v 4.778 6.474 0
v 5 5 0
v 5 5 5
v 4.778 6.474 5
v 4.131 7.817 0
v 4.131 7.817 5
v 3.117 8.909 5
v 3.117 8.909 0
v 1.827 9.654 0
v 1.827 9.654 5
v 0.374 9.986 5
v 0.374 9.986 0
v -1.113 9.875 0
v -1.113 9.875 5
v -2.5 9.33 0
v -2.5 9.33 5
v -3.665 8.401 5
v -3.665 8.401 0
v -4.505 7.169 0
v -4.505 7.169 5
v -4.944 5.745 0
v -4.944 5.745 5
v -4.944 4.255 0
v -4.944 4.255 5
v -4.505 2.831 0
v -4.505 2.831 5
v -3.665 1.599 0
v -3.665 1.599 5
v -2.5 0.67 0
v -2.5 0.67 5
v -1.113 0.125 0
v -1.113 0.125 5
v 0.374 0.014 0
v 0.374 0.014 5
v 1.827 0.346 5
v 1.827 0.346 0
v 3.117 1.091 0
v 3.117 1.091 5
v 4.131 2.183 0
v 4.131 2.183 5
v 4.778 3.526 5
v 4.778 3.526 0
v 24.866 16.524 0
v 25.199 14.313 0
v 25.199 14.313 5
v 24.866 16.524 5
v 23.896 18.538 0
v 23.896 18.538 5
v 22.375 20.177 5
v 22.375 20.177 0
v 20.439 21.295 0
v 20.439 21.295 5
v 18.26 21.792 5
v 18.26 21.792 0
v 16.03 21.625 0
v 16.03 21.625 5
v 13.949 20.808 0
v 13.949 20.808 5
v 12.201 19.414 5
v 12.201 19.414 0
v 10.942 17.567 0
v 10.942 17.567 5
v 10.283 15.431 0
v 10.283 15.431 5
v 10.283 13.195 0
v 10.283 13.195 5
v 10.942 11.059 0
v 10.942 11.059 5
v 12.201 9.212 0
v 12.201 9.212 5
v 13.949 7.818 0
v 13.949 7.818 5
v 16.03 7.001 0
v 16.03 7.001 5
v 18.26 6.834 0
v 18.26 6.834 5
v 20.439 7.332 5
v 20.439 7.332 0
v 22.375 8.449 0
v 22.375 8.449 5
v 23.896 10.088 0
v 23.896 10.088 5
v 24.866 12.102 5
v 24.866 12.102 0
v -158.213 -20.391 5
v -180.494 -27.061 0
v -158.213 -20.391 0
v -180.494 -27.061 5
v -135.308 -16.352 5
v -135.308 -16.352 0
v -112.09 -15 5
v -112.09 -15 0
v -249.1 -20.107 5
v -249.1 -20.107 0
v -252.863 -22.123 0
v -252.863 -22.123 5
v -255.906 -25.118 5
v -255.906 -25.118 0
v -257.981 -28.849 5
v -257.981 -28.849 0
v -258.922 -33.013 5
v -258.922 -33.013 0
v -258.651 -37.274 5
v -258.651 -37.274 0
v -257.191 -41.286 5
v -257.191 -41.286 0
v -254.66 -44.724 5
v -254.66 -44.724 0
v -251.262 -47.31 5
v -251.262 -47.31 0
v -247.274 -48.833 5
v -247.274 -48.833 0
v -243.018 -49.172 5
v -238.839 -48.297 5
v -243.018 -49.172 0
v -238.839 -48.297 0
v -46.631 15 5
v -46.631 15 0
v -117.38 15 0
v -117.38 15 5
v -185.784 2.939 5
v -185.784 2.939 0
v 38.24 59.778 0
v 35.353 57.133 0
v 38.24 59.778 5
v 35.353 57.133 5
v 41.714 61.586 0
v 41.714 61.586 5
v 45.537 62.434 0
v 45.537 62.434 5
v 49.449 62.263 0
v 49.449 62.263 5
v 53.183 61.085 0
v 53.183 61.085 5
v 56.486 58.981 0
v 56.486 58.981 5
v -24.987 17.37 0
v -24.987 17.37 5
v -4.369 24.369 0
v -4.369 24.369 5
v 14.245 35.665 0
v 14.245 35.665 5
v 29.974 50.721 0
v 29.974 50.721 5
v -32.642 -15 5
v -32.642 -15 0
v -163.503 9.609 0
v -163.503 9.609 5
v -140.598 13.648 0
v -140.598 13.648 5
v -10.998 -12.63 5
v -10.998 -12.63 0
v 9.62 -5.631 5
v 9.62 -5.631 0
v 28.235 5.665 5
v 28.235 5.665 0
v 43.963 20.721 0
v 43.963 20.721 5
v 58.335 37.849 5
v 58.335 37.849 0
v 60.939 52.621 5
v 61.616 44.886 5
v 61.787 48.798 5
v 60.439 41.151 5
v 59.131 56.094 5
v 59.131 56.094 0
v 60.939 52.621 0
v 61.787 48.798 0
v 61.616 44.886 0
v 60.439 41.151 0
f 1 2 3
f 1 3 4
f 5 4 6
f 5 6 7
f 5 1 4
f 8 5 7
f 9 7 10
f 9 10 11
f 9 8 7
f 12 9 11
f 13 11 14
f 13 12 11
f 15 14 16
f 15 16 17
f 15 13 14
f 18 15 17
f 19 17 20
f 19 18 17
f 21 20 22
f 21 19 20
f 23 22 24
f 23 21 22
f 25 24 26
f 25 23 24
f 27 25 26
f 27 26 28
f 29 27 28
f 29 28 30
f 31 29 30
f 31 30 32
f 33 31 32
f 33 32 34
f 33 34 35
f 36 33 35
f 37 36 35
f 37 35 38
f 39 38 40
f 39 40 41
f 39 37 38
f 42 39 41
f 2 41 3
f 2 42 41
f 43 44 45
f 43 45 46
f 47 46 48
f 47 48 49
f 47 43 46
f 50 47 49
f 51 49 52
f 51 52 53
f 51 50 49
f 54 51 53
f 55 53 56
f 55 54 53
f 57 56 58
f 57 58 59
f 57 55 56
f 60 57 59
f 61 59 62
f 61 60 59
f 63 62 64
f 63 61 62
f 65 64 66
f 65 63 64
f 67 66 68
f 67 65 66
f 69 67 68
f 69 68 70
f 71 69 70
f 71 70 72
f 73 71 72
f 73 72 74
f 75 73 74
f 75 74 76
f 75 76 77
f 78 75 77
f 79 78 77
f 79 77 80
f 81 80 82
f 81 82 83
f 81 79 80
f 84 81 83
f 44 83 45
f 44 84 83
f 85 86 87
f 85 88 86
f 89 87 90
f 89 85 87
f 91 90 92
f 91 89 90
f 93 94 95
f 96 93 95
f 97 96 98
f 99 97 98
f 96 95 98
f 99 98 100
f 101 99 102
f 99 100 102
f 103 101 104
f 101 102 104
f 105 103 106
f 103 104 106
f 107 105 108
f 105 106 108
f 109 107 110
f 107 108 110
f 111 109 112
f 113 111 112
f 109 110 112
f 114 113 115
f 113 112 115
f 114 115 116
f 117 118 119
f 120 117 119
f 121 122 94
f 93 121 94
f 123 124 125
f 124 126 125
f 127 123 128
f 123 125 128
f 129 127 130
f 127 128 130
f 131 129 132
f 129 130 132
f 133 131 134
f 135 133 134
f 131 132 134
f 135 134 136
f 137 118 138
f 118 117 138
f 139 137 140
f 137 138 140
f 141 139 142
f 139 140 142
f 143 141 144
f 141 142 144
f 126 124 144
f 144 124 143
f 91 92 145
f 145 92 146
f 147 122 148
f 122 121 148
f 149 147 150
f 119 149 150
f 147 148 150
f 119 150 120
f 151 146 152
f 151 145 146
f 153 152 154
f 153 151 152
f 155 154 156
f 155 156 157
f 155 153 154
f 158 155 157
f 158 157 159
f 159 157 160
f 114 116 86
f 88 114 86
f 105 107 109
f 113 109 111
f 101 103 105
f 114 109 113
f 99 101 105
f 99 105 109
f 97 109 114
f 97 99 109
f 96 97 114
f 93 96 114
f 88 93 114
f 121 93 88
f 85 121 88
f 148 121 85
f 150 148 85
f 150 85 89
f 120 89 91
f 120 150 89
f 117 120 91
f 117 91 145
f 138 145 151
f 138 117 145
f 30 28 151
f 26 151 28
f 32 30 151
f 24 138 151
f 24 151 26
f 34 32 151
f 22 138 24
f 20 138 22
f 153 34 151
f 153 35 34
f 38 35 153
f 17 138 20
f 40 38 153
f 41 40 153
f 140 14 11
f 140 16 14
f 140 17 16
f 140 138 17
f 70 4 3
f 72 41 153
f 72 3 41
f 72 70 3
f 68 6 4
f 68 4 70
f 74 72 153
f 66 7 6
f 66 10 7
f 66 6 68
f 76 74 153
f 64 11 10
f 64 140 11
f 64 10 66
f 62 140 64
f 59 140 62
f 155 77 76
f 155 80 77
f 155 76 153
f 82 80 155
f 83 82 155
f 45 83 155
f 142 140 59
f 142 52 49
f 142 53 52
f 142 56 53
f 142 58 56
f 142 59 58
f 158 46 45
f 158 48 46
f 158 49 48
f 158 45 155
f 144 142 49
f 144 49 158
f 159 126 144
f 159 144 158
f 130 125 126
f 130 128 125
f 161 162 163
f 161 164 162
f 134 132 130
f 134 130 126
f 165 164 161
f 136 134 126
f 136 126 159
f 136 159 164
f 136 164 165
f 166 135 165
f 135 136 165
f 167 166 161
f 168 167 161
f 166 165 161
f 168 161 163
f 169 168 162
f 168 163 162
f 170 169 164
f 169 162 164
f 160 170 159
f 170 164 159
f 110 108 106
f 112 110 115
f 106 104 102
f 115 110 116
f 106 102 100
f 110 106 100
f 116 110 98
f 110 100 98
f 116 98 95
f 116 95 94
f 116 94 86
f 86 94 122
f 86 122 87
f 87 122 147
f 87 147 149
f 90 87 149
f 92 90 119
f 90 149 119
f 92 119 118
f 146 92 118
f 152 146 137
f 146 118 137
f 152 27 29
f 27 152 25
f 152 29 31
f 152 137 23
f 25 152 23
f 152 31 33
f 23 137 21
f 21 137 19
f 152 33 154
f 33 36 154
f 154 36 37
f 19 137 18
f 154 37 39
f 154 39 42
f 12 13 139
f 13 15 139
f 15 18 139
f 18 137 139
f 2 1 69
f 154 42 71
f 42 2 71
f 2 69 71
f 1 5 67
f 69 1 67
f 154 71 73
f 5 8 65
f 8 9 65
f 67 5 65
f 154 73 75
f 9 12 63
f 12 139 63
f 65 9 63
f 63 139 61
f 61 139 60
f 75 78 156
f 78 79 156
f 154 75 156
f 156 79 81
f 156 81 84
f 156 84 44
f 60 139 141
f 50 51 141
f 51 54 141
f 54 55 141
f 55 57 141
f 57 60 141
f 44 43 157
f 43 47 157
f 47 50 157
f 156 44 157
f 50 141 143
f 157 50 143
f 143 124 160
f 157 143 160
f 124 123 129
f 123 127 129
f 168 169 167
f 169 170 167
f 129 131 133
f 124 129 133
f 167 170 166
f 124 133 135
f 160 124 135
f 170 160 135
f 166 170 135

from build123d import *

# Parameters (mm, degrees)
SKETCH_2_R      = 5
SKETCH_2_R_2    = 7.5
EXTRUDE_1_DEPTH = 5
FILLET_1_R      = 200
FILLET_2_R      = 100
FILLET_3_R      = 15


with BuildPart() as part:
    # 草图2 → 凸台-拉伸1 (new body)
    with BuildSketch(Plane.XY):
        with BuildLine():
            Line((-152.644904711, 15), (-249.099564228, -20.106625021))
            ThreePointArc((-249.099564228, -20.106625021), (-258.06465139, -39.332316482), (-238.838959929, -48.297403644))
            Line((-238.838959929, -48.297403644), (-147.355095289, -15))
            Line((-147.355095289, -15), (13.989229745, -15))
            Line((13.989229745, -15), (67.976465972, 49.339482728))
            Line((67.976465972, 49.339482728), (44.995132678, 68.623111018))
            Line((44.995132678, 68.623111018), (0, 15))
            Line((0, 15), (-152.644904711, 15))
        make_face()
        with Locations((0, 5)):
            Circle(SKETCH_2_R, mode=Mode.SUBTRACT)
        with Locations((17.699325905, 14.313101658)):
            Circle(SKETCH_2_R_2, mode=Mode.SUBTRACT)
    extrude(amount=EXTRUDE_1_DEPTH)

    # 圆角1
    fillet_1_edges = [part.edges().sort_by_distance(p)[0] for p in [
        (-152.644904711, 15, 2.5),
        (-147.355095289, -15, 2.5),
    ]]
    fillet(fillet_1_edges, radius=FILLET_1_R)

    # 圆角2
    fillet_2_edges = [part.edges().sort_by_distance(p)[0] for p in [
        (0, 15, 2.5),
        (13.989229745, -15, 2.5),
    ]]
    fillet(fillet_2_edges, radius=FILLET_2_R)

    # 圆角3
    fillet_3_edges = [part.edges().sort_by_distance(p)[0] for p in [
        (44.995132678, 68.623111018, 2.5),
        (67.976465972, 49.339482728, 2.5),
    ]]
    fillet(fillet_3_edges, radius=FILLET_3_R - 0.0001)  # a hair under: the kernel refuses the full size


solid = part.part
